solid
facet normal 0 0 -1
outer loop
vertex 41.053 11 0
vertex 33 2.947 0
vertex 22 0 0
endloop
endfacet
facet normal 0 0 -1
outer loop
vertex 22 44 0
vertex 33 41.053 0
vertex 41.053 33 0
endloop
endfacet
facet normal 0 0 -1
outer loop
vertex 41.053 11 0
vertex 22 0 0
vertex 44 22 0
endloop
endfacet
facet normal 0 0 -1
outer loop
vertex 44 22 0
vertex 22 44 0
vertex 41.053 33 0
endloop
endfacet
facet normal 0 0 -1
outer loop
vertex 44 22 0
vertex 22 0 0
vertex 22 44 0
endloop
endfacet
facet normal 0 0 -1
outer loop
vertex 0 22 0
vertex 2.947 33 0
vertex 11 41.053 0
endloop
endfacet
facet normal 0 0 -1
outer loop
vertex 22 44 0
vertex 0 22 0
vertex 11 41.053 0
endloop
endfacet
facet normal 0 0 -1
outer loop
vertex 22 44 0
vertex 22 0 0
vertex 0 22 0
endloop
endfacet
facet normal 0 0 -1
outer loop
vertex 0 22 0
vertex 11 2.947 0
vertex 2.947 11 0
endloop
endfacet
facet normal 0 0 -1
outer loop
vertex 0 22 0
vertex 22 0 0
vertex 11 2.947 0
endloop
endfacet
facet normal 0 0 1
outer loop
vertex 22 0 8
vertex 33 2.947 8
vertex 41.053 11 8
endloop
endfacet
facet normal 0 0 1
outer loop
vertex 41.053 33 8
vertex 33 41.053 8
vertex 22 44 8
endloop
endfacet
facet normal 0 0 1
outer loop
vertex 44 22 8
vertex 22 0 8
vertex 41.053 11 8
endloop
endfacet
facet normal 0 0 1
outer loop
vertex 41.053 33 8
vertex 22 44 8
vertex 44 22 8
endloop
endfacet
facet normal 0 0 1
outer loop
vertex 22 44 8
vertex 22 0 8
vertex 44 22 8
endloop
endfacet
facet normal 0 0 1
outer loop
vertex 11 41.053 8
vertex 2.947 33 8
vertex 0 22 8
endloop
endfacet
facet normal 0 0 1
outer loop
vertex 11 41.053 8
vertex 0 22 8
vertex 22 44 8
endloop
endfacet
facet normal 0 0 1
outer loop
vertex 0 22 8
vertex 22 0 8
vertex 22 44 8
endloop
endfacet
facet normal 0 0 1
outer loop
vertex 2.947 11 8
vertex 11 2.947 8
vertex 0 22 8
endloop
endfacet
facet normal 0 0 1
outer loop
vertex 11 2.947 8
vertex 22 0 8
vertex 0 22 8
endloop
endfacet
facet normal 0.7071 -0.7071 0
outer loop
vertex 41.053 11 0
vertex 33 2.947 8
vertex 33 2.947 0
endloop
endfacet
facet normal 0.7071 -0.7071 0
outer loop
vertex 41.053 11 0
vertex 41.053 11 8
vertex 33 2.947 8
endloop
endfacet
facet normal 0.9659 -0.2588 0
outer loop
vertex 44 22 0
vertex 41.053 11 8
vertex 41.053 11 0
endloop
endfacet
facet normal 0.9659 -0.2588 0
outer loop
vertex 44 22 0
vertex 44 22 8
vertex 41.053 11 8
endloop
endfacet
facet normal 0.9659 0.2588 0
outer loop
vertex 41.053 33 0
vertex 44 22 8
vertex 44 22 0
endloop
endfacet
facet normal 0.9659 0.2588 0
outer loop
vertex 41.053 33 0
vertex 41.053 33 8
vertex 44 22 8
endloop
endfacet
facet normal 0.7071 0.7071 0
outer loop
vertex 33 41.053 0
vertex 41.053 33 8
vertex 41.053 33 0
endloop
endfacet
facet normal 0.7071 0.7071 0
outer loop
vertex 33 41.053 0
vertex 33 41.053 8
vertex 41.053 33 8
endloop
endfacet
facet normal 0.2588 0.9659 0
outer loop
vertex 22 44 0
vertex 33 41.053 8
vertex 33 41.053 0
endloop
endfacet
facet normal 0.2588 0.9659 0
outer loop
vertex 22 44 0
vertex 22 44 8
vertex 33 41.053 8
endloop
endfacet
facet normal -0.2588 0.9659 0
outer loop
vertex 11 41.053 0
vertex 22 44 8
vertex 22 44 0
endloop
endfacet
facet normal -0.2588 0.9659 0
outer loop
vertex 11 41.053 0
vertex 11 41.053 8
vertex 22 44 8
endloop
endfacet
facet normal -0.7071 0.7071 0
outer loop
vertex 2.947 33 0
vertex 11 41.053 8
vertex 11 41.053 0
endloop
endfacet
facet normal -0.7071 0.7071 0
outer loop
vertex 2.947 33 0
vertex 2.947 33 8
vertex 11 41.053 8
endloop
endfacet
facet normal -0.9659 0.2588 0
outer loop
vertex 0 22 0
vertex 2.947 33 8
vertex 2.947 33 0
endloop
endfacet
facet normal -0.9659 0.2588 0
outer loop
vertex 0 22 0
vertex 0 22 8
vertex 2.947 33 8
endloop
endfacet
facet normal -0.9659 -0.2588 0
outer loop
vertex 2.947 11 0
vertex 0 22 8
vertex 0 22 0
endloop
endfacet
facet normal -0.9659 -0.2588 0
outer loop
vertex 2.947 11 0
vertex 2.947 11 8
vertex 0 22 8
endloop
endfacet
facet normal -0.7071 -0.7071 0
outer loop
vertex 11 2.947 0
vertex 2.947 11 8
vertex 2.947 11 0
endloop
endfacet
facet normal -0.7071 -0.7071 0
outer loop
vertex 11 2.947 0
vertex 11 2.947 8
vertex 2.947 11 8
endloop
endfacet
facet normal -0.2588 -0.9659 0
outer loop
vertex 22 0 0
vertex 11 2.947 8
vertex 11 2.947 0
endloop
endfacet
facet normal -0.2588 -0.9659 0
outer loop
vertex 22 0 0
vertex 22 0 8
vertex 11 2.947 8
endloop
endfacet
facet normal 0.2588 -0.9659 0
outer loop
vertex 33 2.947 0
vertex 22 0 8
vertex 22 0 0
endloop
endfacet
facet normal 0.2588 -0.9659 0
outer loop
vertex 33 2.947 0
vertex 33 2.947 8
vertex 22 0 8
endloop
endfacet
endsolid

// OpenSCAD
$fn = 32;

// ----------------------------------------------------------------------
// Eccentric disc: step, 8 mm thick
// ----------------------------------------------------------------------

// --- parameters (mm) ---
profile_height = 8;       // extrusion height
profile_points = 12;      // points of the closed outline

profile = [[0, 22], [2.947, 11], [11, 2.947], [22, 0], [33, 2.947], [41.053, 11], [44, 22], [41.053, 33], [33, 41.053], [22, 44], [11, 41.053], [2.947, 33]];  // single closed polygon, 12 points, counter clockwise

// --- the one profile operation ---
linear_extrude(height = profile_height) polygon(points = profile);
